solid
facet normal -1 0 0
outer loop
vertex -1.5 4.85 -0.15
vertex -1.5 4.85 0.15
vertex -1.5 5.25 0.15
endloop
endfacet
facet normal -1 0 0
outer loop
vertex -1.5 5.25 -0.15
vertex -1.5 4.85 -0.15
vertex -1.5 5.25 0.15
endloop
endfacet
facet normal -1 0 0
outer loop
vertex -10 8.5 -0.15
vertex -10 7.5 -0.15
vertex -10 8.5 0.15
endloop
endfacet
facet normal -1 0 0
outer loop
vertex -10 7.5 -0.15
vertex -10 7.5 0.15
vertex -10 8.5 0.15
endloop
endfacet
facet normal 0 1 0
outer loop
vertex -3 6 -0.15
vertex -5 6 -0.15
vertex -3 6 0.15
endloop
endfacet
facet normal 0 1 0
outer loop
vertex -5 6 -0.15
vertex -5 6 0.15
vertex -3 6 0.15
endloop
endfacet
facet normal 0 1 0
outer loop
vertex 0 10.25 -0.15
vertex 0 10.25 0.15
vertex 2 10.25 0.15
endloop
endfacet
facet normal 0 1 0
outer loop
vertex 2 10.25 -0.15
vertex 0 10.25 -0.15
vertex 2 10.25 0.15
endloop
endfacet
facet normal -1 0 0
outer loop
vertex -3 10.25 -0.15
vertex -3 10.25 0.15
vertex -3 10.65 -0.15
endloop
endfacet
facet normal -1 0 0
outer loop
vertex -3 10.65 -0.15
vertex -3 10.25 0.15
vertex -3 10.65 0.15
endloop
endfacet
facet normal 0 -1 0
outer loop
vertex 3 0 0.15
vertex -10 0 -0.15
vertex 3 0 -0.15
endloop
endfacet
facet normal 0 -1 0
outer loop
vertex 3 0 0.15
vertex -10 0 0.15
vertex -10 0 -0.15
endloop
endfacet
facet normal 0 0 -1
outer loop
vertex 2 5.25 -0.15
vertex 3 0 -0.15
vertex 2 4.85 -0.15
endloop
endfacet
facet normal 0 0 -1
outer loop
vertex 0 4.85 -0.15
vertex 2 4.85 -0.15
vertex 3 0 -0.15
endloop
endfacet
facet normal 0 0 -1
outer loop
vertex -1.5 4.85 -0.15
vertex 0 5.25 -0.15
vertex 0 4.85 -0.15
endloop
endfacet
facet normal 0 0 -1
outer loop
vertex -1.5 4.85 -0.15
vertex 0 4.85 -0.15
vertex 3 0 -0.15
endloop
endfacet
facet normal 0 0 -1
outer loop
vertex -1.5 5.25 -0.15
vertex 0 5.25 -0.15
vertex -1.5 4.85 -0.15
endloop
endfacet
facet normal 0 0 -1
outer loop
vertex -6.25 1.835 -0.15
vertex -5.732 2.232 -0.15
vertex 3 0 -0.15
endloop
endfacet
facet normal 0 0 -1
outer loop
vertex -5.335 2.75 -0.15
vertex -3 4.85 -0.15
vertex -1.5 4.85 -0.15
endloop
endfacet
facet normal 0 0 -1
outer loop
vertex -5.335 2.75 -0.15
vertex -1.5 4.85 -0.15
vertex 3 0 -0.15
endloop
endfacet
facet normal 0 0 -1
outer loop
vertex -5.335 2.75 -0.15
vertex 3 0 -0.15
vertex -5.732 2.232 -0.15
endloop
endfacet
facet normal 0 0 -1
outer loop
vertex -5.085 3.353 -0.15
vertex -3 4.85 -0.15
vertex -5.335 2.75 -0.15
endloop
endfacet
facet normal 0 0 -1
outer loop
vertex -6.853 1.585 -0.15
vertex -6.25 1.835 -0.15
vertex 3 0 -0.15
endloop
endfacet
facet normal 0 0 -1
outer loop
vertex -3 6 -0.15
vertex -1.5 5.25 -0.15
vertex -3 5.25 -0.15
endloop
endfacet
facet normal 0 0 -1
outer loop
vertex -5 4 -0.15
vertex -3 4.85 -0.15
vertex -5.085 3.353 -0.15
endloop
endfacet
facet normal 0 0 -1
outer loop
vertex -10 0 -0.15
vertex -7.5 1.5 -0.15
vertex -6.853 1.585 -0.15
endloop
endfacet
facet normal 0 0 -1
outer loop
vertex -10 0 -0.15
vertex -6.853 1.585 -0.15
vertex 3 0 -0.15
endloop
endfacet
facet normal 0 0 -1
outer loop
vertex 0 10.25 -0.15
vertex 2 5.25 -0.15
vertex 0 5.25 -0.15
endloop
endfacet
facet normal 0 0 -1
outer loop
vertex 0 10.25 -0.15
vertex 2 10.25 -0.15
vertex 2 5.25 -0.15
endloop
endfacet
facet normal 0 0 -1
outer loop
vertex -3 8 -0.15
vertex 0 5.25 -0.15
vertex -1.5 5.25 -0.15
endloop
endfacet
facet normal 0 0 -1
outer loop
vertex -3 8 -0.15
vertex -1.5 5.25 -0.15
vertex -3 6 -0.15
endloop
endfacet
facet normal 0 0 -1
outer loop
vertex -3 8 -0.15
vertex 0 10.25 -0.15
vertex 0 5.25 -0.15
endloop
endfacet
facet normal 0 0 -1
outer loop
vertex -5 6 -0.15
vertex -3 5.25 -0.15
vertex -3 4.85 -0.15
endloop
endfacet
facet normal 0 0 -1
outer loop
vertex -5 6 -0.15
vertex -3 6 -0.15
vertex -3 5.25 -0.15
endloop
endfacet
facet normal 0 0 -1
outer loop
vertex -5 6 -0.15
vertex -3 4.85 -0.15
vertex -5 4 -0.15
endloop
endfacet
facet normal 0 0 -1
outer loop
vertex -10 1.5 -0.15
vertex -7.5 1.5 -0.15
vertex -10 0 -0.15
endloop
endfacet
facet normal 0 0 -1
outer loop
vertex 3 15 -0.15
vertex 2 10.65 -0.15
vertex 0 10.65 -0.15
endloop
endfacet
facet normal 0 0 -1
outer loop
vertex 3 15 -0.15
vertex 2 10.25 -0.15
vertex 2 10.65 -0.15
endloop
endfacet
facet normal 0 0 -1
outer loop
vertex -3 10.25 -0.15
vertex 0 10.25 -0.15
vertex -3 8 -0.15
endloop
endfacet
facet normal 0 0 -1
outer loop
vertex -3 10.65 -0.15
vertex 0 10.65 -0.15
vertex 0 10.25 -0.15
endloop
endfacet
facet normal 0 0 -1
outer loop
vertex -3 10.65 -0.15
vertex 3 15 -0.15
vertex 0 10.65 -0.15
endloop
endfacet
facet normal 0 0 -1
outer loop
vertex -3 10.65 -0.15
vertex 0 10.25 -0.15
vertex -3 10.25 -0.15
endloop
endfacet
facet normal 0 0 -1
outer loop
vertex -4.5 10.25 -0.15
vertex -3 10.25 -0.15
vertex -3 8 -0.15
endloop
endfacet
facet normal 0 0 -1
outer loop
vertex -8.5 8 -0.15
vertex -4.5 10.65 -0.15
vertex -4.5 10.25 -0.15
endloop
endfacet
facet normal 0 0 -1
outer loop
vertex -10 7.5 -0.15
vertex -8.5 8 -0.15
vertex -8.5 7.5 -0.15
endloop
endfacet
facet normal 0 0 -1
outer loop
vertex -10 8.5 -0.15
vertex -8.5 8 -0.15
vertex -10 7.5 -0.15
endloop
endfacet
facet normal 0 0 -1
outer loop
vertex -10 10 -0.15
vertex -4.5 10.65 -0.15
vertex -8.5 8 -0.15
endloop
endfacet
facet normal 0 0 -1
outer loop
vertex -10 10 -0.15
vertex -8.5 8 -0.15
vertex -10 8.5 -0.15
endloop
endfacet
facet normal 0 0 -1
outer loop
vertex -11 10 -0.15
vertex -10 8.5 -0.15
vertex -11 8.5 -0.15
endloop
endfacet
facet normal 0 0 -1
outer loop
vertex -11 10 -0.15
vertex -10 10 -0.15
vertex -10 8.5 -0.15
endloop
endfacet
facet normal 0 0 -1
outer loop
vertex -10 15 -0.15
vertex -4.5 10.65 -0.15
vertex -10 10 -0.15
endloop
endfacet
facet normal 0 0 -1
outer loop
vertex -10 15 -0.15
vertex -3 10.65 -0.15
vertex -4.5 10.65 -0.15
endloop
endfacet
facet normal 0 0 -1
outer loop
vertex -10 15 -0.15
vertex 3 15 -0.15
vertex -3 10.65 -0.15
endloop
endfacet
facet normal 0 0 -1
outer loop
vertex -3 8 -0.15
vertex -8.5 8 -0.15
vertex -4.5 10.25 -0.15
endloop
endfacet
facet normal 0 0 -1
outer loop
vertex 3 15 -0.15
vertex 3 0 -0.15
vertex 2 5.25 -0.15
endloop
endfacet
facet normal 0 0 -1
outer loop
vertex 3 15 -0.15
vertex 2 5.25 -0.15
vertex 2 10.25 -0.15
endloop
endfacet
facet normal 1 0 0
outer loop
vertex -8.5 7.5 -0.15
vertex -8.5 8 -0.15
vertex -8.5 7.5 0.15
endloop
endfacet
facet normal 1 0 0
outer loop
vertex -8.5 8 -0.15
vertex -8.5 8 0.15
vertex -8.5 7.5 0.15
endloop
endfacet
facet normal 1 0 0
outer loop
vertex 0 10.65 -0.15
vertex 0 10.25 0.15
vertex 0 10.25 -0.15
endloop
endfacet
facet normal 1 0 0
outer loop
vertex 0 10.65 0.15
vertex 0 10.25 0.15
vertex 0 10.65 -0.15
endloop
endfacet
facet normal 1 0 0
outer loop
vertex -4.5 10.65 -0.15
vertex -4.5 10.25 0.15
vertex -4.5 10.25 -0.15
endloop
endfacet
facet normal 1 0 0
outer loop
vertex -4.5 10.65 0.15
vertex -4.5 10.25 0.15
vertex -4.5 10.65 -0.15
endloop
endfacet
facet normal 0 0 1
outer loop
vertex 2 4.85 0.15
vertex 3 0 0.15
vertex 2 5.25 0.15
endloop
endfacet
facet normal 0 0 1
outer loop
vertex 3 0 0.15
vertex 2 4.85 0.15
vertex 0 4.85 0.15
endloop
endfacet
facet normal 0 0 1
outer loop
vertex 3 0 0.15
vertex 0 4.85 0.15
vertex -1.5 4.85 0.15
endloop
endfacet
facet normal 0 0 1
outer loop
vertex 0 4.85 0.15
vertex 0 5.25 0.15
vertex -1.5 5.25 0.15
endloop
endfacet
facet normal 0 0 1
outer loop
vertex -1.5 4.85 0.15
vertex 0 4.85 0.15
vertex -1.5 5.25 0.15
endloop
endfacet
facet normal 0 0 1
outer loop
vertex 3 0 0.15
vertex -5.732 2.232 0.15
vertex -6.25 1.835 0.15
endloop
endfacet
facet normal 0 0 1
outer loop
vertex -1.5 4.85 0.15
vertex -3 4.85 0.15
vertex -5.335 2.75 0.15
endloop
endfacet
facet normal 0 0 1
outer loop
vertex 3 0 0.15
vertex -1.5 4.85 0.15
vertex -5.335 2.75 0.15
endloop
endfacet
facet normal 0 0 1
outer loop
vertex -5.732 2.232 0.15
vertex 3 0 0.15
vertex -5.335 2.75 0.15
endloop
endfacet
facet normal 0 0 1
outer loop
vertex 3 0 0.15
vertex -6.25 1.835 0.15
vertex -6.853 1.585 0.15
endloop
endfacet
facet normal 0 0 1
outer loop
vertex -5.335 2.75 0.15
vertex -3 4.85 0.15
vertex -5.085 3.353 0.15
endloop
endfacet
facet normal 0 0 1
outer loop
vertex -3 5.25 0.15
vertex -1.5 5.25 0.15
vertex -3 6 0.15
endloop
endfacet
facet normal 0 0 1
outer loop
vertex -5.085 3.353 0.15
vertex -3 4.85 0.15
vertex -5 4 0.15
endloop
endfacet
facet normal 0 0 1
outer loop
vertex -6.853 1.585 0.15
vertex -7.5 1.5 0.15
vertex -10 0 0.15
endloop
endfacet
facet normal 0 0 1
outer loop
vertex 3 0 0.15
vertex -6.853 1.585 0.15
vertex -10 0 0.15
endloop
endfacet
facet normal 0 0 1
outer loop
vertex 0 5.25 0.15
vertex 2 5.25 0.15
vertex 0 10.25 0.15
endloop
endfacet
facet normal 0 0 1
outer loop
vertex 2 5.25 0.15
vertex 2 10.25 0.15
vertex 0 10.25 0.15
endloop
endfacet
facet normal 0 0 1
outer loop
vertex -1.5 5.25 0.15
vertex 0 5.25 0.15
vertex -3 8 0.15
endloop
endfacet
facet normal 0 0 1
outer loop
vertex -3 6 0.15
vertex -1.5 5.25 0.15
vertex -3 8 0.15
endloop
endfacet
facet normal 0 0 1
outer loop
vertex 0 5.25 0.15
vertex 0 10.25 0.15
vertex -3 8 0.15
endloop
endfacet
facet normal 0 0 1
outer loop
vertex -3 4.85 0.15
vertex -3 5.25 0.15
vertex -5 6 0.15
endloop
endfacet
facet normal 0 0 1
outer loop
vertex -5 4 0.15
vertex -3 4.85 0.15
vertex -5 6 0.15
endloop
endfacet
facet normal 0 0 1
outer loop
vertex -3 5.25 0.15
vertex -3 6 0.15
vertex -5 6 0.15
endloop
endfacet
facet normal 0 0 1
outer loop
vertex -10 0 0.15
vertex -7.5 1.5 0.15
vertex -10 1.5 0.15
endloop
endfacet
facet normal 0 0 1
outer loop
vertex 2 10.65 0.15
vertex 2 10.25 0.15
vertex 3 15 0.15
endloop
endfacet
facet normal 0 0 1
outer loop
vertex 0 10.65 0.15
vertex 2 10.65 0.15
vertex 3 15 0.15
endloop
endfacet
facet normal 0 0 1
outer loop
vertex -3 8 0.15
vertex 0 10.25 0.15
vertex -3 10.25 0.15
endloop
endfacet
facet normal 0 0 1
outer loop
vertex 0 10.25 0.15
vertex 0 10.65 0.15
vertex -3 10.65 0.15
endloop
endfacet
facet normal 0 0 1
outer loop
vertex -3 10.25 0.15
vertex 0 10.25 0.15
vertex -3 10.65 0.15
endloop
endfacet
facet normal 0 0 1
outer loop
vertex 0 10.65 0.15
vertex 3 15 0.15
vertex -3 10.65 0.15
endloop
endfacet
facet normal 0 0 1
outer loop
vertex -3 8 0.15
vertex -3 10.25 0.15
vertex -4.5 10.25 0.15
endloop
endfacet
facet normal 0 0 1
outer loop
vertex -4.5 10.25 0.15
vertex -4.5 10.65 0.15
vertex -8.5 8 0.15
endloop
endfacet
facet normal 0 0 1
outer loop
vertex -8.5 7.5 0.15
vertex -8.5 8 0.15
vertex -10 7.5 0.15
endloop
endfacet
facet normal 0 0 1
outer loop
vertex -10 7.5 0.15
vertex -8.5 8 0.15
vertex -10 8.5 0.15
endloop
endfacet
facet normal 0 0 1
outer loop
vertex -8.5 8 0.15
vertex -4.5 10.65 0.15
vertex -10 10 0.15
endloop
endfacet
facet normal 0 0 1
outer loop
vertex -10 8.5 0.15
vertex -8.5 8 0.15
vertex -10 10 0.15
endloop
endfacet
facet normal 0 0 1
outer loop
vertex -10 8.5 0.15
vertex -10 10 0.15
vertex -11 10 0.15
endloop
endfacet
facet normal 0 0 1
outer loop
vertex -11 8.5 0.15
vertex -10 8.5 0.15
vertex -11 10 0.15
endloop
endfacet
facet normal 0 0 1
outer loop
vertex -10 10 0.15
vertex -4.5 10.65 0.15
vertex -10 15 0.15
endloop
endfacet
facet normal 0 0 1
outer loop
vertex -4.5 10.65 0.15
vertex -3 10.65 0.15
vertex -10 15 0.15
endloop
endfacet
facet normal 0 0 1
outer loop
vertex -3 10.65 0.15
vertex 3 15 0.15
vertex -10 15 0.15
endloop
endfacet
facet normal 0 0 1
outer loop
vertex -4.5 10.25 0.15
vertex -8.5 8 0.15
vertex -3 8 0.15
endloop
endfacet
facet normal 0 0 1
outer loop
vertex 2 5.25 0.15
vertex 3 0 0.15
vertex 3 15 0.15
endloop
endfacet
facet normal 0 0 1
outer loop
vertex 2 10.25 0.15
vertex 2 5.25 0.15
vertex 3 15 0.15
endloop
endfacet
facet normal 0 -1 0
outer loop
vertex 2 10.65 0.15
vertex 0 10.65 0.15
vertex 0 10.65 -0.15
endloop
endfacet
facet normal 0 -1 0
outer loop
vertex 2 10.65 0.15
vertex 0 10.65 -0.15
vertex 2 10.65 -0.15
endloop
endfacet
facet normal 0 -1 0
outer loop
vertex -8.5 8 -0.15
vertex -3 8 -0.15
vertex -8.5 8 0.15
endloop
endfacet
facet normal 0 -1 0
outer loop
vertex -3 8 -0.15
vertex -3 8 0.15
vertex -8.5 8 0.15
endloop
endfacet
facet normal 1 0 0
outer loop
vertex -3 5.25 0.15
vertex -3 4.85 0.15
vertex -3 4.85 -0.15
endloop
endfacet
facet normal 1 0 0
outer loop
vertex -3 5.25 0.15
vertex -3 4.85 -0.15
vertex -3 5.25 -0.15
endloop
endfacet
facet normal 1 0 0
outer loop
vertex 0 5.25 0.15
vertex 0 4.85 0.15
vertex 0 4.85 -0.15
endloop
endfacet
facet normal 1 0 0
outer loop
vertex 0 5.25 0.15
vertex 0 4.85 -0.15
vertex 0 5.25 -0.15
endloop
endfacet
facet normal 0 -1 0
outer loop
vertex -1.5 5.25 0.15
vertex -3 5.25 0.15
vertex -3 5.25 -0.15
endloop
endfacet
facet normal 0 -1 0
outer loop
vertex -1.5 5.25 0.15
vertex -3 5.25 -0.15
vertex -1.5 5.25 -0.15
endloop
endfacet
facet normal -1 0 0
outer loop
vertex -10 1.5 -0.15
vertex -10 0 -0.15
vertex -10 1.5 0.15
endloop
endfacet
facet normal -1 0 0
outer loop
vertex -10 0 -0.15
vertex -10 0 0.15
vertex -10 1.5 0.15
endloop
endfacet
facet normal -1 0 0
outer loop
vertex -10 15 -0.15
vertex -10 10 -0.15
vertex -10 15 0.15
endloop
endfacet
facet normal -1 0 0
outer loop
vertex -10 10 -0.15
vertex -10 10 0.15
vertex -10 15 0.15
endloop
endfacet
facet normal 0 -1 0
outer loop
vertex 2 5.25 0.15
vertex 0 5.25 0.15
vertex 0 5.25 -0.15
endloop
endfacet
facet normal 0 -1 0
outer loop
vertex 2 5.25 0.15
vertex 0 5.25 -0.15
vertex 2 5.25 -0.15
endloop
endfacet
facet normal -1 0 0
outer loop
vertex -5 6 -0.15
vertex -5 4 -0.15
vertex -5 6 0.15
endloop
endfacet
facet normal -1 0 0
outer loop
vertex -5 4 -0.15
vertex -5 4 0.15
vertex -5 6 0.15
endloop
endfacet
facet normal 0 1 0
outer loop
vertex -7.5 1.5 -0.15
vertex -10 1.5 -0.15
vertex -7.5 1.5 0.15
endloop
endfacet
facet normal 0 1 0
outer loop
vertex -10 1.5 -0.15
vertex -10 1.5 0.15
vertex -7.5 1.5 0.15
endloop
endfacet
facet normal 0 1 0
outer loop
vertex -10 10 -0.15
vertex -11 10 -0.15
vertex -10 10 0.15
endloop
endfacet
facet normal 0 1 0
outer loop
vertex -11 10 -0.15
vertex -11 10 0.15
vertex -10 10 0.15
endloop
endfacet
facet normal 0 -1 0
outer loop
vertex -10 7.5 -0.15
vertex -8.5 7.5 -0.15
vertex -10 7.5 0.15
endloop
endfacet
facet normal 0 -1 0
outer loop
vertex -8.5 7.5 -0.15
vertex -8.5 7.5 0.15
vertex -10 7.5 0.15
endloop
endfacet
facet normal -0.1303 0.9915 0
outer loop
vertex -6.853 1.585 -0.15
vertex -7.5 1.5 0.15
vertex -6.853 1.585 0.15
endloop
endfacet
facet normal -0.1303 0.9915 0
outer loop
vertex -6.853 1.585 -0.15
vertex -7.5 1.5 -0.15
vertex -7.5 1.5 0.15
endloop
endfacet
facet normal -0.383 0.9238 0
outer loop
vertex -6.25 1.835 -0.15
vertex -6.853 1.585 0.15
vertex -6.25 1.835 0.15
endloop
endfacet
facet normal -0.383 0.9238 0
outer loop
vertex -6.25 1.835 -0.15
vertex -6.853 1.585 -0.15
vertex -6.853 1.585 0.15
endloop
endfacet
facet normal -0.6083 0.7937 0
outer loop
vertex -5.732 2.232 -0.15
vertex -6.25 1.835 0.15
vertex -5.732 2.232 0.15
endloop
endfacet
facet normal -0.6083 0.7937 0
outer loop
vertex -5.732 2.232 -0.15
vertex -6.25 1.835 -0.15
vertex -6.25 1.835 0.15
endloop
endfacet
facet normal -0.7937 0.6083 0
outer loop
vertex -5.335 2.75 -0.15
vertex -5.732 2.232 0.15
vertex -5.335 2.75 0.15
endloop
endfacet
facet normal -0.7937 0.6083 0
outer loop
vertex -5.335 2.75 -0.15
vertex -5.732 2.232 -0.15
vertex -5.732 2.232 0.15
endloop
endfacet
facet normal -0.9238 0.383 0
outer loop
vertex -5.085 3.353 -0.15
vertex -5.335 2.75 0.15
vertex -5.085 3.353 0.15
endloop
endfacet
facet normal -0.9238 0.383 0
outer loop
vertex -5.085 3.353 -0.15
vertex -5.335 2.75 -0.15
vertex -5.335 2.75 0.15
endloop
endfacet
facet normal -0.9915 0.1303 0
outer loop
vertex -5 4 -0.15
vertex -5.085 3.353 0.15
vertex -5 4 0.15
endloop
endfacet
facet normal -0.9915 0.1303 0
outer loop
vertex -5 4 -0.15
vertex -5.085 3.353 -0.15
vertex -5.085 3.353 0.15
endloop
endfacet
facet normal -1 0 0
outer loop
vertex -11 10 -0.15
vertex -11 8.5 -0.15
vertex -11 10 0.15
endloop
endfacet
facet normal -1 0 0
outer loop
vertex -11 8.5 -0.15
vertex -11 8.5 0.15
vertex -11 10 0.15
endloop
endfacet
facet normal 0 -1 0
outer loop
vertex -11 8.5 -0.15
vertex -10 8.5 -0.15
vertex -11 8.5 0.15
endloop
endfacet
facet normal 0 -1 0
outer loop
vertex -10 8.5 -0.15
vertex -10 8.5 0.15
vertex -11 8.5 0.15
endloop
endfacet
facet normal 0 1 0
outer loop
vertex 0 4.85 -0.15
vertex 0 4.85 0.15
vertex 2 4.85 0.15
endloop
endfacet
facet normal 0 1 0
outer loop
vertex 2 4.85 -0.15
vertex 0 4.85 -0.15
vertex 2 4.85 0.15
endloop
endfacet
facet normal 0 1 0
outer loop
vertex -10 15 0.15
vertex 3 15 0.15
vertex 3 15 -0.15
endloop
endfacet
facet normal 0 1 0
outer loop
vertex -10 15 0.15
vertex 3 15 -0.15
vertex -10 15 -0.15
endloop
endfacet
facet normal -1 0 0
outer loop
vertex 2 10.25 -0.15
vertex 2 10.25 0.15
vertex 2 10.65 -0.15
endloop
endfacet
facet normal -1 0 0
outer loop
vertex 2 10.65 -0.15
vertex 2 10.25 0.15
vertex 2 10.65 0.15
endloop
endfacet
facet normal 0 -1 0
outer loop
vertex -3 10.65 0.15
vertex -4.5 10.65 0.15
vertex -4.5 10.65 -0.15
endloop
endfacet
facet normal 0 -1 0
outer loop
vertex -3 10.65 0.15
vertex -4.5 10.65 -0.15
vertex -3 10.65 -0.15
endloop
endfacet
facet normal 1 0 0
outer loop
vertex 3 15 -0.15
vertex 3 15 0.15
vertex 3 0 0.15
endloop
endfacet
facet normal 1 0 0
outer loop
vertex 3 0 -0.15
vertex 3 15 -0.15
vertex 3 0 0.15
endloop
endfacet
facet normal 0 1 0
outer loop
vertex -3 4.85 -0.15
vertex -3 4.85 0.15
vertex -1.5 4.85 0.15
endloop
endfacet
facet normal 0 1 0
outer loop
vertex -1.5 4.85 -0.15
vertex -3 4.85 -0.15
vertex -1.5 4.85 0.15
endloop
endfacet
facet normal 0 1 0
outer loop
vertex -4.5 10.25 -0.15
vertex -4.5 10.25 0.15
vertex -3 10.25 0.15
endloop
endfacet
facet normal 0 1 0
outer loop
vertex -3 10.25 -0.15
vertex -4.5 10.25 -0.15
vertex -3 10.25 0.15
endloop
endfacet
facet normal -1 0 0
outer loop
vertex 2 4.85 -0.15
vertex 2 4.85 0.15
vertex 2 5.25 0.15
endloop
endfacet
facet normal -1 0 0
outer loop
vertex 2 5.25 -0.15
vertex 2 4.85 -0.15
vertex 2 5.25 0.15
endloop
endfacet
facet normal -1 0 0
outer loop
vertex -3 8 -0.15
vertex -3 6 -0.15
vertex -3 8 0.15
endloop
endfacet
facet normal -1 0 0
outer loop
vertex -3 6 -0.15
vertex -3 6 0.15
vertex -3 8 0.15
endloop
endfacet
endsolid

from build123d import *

# Parameters (mm, degrees)
BOSS_EXTRUDE1_DEPTH = 0.15
FILLET4_R           = 2.5
SKETCH3_W           = 2
SKETCH3_H           = 0.4
SKETCH3_W_2         = 1.5
CUT_EXTRUDE1_DEPTH  = 19.603494295


with BuildPart() as part:
    # Sketch1 → Boss-Extrude1 (new, symmetric)
    with BuildSketch(Plane.XY):
        Polygon((0, 0), (-10, 0), (-10, 1.5), (-5, 1.5), (-5, 6), (-3, 6), (-3, 8), (-8.5, 8), (-8.5, 7.5), (-10, 7.5), (-10, 8.5), (-11, 8.5), (-11, 10), (-10, 10), (-10, 15), (0, 15), (3, 15), (3, 0), align=None)
    extrude(amount=BOSS_EXTRUDE1_DEPTH, both=True)

    # Fillet4
    fillet4_edges = [part.edges().sort_by_distance(p)[0] for p in [
        (-5, 1.5, 0),
    ]]
    fillet(fillet4_edges, radius=FILLET4_R)

    # Sketch3 → Cut-Extrude1 (cut, through all)
    with BuildSketch(Plane.XY.offset(0.15)):
        with Locations((1, 5.05)):
            Rectangle(SKETCH3_W, SKETCH3_H)
        with Locations((-2.25, 5.05)):
            Rectangle(SKETCH3_W_2, SKETCH3_H)
        with Locations((1, 10.45)):
            Rectangle(SKETCH3_W, SKETCH3_H)
        with Locations((-3.75, 10.45)):
            Rectangle(SKETCH3_W_2, SKETCH3_H)
    extrude(amount=-CUT_EXTRUDE1_DEPTH, mode=Mode.SUBTRACT)


solid = part.part
